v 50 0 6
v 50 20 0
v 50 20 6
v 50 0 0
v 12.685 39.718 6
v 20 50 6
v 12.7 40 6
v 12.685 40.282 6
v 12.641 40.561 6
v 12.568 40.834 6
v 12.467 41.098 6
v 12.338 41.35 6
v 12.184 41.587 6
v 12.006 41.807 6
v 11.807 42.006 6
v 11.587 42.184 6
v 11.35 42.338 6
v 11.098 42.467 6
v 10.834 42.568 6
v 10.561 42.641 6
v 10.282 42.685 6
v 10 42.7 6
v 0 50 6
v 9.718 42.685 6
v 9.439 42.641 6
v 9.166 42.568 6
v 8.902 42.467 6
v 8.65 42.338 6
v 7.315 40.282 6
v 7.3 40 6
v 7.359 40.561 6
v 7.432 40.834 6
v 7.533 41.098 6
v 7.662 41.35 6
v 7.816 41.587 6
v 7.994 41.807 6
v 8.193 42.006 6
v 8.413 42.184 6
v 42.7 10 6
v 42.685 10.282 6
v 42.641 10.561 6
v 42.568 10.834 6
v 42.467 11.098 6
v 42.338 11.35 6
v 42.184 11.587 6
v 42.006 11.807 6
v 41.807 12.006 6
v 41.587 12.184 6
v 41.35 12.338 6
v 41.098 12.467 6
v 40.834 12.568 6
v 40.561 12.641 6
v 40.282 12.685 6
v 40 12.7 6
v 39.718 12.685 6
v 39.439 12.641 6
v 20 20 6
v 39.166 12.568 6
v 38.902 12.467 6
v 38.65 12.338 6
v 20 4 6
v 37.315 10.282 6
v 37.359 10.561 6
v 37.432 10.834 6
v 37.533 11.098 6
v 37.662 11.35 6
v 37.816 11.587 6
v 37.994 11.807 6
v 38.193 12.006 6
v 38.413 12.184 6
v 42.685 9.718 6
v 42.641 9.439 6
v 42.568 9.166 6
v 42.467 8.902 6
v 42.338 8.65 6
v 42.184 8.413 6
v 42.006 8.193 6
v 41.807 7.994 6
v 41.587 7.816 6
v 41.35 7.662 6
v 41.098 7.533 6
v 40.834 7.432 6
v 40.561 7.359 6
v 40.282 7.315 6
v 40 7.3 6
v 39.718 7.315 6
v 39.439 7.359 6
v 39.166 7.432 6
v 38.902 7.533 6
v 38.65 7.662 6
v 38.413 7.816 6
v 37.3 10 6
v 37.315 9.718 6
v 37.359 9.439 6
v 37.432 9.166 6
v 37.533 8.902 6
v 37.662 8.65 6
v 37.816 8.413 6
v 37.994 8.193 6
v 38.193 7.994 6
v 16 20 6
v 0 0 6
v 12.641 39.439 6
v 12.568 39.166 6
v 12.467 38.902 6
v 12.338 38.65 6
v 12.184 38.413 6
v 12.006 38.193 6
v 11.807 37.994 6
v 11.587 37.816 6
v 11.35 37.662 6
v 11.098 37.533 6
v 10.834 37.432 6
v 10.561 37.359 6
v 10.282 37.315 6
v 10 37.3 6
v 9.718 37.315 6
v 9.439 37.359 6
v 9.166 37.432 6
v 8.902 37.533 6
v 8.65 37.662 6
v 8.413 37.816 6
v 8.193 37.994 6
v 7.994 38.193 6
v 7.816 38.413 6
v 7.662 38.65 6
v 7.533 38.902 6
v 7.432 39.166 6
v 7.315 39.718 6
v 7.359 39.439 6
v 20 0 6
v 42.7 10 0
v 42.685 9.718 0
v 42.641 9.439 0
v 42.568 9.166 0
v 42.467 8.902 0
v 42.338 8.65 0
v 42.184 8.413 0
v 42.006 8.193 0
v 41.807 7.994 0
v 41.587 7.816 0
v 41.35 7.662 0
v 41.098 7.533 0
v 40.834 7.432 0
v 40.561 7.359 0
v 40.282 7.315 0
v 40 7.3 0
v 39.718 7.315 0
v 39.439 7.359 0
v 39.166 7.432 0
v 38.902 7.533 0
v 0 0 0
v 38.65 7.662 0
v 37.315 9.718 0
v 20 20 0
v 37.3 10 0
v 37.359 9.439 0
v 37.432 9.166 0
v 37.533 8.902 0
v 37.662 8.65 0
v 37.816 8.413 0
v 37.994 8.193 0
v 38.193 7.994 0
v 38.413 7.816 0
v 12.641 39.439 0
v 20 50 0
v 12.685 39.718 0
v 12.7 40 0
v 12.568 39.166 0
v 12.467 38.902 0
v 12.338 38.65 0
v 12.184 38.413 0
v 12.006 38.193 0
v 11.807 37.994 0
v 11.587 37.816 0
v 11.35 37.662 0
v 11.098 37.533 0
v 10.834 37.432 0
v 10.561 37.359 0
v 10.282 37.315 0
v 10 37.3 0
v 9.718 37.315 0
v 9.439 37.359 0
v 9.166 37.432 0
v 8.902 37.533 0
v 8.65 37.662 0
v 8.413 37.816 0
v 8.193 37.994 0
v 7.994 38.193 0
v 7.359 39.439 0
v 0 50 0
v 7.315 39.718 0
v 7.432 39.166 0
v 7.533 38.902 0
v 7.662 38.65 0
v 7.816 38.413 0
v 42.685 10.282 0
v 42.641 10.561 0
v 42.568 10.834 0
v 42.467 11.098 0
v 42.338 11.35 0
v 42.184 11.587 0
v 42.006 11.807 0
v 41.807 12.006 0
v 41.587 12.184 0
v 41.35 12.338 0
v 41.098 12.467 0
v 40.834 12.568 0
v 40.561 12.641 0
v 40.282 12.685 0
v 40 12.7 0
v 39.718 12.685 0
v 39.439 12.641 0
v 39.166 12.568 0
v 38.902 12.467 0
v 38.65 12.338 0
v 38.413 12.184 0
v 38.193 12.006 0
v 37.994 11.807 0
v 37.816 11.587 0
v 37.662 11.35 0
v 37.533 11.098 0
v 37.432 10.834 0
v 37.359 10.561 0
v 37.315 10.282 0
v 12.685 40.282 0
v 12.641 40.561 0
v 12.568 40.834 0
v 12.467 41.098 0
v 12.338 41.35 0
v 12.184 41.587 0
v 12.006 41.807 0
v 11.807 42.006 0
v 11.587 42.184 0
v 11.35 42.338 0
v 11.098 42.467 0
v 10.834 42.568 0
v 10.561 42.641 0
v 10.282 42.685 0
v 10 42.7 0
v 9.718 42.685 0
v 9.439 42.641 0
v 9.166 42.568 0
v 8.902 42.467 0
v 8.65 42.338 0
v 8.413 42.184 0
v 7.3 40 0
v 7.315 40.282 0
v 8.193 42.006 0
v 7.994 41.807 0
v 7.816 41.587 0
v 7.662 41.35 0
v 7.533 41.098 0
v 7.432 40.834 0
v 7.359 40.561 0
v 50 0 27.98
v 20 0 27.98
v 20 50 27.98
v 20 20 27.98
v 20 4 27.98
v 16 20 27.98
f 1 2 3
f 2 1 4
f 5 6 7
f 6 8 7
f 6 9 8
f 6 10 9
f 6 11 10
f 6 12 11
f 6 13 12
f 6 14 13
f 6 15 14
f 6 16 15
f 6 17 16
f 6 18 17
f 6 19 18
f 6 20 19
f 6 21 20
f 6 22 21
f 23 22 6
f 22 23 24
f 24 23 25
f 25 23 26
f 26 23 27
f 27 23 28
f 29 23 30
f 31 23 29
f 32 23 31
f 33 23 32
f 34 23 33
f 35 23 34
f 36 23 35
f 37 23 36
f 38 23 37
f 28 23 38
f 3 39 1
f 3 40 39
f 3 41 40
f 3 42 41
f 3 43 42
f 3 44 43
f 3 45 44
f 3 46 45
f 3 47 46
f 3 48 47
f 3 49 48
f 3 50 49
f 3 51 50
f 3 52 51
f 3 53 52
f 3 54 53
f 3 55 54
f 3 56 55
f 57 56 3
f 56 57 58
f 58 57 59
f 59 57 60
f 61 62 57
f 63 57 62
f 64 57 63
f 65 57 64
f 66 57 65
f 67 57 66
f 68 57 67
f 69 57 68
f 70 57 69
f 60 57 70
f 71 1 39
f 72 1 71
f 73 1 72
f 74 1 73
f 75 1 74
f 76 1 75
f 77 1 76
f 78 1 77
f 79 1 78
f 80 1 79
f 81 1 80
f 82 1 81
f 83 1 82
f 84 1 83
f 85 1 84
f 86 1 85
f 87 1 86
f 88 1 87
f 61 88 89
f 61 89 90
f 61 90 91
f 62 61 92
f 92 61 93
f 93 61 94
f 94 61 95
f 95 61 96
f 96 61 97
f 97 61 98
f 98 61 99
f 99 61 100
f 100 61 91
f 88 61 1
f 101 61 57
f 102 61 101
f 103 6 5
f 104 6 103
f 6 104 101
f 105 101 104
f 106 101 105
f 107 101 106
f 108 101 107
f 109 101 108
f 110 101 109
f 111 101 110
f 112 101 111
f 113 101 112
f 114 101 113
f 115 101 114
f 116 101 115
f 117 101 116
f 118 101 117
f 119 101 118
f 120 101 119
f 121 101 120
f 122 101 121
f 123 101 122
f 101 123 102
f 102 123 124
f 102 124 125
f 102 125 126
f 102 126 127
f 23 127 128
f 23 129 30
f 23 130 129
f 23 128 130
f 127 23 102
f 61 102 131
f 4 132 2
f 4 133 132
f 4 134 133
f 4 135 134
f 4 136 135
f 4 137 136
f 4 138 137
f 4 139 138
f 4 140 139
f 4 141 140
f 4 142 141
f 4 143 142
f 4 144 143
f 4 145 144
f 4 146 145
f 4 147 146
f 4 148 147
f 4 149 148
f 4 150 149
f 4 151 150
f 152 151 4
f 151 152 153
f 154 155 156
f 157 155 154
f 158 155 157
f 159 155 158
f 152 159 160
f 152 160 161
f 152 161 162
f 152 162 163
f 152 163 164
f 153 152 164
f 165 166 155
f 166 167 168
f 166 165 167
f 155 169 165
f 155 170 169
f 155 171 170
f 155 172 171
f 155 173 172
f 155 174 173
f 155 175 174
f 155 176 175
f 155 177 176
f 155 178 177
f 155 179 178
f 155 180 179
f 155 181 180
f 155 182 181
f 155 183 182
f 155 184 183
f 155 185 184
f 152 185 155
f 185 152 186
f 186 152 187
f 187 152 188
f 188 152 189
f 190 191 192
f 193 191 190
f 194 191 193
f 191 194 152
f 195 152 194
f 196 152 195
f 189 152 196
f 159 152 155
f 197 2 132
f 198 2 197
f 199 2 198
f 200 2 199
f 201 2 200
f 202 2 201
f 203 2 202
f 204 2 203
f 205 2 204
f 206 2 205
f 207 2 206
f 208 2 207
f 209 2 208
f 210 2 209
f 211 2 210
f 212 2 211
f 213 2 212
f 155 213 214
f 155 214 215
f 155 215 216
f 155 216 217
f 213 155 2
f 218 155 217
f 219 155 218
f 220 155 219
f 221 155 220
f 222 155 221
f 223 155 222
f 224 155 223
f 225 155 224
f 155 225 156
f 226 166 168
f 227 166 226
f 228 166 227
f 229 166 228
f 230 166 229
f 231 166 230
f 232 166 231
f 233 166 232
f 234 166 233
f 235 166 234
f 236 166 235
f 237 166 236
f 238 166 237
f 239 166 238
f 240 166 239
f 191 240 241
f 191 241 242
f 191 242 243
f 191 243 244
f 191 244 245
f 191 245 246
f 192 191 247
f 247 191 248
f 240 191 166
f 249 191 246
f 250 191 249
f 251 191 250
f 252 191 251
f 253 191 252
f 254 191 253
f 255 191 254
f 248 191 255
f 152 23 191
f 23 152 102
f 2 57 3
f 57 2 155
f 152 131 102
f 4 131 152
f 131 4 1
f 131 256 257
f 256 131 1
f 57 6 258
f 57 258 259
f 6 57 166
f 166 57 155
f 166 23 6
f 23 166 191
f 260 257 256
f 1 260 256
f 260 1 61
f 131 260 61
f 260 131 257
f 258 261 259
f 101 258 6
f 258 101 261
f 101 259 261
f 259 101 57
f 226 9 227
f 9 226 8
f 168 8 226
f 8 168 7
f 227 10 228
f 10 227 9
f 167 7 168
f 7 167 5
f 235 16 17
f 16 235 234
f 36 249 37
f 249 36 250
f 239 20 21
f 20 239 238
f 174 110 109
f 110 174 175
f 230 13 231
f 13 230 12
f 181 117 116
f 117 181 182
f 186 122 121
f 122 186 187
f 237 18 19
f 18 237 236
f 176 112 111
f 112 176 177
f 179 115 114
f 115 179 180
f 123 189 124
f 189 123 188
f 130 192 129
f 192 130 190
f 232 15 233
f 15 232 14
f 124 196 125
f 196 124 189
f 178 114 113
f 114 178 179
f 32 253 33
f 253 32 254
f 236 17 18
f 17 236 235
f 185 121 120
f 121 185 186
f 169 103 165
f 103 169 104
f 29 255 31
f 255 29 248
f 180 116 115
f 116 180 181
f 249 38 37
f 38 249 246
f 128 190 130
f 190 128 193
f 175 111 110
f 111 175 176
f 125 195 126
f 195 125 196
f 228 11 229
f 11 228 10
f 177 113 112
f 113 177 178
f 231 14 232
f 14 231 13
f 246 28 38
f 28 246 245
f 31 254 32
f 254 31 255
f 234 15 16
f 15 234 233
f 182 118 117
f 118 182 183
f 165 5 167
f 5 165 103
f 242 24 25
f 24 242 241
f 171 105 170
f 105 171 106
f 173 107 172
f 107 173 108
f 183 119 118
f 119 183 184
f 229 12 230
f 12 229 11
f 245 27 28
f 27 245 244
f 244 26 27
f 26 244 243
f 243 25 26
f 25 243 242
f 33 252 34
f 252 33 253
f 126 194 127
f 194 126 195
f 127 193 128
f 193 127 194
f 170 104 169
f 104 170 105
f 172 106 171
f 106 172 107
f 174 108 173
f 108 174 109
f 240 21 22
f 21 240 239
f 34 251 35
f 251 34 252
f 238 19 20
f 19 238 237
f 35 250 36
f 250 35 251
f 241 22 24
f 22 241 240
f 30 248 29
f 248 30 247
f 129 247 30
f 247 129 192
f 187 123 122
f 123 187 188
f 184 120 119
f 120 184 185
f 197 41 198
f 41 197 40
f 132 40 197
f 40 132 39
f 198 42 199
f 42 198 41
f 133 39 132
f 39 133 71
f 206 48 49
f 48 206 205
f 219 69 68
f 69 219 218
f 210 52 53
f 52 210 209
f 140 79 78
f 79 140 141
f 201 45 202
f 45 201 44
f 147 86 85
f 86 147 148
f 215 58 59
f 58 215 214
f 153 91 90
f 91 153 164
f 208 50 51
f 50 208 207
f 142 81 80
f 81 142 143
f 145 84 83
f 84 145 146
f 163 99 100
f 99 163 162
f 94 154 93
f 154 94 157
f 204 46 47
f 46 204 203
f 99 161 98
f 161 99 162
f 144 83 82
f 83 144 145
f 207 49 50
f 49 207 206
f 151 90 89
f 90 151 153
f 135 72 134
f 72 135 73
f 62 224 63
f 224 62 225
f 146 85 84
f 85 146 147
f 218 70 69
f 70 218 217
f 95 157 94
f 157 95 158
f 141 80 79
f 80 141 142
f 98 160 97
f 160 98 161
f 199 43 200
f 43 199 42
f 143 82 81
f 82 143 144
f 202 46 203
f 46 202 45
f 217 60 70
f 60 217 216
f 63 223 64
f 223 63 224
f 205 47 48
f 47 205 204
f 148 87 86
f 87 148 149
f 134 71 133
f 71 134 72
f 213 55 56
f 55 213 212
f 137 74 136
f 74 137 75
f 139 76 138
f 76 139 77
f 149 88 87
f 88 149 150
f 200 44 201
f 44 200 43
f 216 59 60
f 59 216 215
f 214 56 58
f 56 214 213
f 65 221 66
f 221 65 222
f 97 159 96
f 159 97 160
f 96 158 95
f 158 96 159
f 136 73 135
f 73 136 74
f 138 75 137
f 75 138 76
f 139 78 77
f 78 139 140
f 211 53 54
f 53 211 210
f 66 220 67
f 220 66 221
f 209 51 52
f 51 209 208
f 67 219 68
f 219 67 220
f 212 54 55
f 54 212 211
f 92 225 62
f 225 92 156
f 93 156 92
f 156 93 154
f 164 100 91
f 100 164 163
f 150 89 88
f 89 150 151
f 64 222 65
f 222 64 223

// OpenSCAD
// Reinforced right-angle gusset for 20 mm profile.
$fn = 60;
eps = 0.02;
profile = 20;
arm = 50;
plate_t = 6;
rib_t = 4;
rib_h = 22;
module rib_x() {
    translate([profile, 0, plate_t - eps]) linear_extrude(height = rib_h)
        polygon(points = [[0, 0], [arm - profile, 0], [0, rib_t]]);
}
module rib_y() {
    translate([profile, profile, plate_t - eps]) rotate([0, 0, 90]) linear_extrude(height = rib_h)
        polygon(points = [[0, 0], [arm - profile, 0], [0, rib_t]]);
}
difference() {
    union() { cube([arm, profile, plate_t]); cube([profile, arm, plate_t]); rib_x(); rib_y(); }
    for (p = [[profile / 2, arm - profile / 2], [arm - profile / 2, profile / 2]])
        translate([p[0], p[1], -eps]) cylinder(d = 5.4, h = plate_t + 2 * eps);
}
